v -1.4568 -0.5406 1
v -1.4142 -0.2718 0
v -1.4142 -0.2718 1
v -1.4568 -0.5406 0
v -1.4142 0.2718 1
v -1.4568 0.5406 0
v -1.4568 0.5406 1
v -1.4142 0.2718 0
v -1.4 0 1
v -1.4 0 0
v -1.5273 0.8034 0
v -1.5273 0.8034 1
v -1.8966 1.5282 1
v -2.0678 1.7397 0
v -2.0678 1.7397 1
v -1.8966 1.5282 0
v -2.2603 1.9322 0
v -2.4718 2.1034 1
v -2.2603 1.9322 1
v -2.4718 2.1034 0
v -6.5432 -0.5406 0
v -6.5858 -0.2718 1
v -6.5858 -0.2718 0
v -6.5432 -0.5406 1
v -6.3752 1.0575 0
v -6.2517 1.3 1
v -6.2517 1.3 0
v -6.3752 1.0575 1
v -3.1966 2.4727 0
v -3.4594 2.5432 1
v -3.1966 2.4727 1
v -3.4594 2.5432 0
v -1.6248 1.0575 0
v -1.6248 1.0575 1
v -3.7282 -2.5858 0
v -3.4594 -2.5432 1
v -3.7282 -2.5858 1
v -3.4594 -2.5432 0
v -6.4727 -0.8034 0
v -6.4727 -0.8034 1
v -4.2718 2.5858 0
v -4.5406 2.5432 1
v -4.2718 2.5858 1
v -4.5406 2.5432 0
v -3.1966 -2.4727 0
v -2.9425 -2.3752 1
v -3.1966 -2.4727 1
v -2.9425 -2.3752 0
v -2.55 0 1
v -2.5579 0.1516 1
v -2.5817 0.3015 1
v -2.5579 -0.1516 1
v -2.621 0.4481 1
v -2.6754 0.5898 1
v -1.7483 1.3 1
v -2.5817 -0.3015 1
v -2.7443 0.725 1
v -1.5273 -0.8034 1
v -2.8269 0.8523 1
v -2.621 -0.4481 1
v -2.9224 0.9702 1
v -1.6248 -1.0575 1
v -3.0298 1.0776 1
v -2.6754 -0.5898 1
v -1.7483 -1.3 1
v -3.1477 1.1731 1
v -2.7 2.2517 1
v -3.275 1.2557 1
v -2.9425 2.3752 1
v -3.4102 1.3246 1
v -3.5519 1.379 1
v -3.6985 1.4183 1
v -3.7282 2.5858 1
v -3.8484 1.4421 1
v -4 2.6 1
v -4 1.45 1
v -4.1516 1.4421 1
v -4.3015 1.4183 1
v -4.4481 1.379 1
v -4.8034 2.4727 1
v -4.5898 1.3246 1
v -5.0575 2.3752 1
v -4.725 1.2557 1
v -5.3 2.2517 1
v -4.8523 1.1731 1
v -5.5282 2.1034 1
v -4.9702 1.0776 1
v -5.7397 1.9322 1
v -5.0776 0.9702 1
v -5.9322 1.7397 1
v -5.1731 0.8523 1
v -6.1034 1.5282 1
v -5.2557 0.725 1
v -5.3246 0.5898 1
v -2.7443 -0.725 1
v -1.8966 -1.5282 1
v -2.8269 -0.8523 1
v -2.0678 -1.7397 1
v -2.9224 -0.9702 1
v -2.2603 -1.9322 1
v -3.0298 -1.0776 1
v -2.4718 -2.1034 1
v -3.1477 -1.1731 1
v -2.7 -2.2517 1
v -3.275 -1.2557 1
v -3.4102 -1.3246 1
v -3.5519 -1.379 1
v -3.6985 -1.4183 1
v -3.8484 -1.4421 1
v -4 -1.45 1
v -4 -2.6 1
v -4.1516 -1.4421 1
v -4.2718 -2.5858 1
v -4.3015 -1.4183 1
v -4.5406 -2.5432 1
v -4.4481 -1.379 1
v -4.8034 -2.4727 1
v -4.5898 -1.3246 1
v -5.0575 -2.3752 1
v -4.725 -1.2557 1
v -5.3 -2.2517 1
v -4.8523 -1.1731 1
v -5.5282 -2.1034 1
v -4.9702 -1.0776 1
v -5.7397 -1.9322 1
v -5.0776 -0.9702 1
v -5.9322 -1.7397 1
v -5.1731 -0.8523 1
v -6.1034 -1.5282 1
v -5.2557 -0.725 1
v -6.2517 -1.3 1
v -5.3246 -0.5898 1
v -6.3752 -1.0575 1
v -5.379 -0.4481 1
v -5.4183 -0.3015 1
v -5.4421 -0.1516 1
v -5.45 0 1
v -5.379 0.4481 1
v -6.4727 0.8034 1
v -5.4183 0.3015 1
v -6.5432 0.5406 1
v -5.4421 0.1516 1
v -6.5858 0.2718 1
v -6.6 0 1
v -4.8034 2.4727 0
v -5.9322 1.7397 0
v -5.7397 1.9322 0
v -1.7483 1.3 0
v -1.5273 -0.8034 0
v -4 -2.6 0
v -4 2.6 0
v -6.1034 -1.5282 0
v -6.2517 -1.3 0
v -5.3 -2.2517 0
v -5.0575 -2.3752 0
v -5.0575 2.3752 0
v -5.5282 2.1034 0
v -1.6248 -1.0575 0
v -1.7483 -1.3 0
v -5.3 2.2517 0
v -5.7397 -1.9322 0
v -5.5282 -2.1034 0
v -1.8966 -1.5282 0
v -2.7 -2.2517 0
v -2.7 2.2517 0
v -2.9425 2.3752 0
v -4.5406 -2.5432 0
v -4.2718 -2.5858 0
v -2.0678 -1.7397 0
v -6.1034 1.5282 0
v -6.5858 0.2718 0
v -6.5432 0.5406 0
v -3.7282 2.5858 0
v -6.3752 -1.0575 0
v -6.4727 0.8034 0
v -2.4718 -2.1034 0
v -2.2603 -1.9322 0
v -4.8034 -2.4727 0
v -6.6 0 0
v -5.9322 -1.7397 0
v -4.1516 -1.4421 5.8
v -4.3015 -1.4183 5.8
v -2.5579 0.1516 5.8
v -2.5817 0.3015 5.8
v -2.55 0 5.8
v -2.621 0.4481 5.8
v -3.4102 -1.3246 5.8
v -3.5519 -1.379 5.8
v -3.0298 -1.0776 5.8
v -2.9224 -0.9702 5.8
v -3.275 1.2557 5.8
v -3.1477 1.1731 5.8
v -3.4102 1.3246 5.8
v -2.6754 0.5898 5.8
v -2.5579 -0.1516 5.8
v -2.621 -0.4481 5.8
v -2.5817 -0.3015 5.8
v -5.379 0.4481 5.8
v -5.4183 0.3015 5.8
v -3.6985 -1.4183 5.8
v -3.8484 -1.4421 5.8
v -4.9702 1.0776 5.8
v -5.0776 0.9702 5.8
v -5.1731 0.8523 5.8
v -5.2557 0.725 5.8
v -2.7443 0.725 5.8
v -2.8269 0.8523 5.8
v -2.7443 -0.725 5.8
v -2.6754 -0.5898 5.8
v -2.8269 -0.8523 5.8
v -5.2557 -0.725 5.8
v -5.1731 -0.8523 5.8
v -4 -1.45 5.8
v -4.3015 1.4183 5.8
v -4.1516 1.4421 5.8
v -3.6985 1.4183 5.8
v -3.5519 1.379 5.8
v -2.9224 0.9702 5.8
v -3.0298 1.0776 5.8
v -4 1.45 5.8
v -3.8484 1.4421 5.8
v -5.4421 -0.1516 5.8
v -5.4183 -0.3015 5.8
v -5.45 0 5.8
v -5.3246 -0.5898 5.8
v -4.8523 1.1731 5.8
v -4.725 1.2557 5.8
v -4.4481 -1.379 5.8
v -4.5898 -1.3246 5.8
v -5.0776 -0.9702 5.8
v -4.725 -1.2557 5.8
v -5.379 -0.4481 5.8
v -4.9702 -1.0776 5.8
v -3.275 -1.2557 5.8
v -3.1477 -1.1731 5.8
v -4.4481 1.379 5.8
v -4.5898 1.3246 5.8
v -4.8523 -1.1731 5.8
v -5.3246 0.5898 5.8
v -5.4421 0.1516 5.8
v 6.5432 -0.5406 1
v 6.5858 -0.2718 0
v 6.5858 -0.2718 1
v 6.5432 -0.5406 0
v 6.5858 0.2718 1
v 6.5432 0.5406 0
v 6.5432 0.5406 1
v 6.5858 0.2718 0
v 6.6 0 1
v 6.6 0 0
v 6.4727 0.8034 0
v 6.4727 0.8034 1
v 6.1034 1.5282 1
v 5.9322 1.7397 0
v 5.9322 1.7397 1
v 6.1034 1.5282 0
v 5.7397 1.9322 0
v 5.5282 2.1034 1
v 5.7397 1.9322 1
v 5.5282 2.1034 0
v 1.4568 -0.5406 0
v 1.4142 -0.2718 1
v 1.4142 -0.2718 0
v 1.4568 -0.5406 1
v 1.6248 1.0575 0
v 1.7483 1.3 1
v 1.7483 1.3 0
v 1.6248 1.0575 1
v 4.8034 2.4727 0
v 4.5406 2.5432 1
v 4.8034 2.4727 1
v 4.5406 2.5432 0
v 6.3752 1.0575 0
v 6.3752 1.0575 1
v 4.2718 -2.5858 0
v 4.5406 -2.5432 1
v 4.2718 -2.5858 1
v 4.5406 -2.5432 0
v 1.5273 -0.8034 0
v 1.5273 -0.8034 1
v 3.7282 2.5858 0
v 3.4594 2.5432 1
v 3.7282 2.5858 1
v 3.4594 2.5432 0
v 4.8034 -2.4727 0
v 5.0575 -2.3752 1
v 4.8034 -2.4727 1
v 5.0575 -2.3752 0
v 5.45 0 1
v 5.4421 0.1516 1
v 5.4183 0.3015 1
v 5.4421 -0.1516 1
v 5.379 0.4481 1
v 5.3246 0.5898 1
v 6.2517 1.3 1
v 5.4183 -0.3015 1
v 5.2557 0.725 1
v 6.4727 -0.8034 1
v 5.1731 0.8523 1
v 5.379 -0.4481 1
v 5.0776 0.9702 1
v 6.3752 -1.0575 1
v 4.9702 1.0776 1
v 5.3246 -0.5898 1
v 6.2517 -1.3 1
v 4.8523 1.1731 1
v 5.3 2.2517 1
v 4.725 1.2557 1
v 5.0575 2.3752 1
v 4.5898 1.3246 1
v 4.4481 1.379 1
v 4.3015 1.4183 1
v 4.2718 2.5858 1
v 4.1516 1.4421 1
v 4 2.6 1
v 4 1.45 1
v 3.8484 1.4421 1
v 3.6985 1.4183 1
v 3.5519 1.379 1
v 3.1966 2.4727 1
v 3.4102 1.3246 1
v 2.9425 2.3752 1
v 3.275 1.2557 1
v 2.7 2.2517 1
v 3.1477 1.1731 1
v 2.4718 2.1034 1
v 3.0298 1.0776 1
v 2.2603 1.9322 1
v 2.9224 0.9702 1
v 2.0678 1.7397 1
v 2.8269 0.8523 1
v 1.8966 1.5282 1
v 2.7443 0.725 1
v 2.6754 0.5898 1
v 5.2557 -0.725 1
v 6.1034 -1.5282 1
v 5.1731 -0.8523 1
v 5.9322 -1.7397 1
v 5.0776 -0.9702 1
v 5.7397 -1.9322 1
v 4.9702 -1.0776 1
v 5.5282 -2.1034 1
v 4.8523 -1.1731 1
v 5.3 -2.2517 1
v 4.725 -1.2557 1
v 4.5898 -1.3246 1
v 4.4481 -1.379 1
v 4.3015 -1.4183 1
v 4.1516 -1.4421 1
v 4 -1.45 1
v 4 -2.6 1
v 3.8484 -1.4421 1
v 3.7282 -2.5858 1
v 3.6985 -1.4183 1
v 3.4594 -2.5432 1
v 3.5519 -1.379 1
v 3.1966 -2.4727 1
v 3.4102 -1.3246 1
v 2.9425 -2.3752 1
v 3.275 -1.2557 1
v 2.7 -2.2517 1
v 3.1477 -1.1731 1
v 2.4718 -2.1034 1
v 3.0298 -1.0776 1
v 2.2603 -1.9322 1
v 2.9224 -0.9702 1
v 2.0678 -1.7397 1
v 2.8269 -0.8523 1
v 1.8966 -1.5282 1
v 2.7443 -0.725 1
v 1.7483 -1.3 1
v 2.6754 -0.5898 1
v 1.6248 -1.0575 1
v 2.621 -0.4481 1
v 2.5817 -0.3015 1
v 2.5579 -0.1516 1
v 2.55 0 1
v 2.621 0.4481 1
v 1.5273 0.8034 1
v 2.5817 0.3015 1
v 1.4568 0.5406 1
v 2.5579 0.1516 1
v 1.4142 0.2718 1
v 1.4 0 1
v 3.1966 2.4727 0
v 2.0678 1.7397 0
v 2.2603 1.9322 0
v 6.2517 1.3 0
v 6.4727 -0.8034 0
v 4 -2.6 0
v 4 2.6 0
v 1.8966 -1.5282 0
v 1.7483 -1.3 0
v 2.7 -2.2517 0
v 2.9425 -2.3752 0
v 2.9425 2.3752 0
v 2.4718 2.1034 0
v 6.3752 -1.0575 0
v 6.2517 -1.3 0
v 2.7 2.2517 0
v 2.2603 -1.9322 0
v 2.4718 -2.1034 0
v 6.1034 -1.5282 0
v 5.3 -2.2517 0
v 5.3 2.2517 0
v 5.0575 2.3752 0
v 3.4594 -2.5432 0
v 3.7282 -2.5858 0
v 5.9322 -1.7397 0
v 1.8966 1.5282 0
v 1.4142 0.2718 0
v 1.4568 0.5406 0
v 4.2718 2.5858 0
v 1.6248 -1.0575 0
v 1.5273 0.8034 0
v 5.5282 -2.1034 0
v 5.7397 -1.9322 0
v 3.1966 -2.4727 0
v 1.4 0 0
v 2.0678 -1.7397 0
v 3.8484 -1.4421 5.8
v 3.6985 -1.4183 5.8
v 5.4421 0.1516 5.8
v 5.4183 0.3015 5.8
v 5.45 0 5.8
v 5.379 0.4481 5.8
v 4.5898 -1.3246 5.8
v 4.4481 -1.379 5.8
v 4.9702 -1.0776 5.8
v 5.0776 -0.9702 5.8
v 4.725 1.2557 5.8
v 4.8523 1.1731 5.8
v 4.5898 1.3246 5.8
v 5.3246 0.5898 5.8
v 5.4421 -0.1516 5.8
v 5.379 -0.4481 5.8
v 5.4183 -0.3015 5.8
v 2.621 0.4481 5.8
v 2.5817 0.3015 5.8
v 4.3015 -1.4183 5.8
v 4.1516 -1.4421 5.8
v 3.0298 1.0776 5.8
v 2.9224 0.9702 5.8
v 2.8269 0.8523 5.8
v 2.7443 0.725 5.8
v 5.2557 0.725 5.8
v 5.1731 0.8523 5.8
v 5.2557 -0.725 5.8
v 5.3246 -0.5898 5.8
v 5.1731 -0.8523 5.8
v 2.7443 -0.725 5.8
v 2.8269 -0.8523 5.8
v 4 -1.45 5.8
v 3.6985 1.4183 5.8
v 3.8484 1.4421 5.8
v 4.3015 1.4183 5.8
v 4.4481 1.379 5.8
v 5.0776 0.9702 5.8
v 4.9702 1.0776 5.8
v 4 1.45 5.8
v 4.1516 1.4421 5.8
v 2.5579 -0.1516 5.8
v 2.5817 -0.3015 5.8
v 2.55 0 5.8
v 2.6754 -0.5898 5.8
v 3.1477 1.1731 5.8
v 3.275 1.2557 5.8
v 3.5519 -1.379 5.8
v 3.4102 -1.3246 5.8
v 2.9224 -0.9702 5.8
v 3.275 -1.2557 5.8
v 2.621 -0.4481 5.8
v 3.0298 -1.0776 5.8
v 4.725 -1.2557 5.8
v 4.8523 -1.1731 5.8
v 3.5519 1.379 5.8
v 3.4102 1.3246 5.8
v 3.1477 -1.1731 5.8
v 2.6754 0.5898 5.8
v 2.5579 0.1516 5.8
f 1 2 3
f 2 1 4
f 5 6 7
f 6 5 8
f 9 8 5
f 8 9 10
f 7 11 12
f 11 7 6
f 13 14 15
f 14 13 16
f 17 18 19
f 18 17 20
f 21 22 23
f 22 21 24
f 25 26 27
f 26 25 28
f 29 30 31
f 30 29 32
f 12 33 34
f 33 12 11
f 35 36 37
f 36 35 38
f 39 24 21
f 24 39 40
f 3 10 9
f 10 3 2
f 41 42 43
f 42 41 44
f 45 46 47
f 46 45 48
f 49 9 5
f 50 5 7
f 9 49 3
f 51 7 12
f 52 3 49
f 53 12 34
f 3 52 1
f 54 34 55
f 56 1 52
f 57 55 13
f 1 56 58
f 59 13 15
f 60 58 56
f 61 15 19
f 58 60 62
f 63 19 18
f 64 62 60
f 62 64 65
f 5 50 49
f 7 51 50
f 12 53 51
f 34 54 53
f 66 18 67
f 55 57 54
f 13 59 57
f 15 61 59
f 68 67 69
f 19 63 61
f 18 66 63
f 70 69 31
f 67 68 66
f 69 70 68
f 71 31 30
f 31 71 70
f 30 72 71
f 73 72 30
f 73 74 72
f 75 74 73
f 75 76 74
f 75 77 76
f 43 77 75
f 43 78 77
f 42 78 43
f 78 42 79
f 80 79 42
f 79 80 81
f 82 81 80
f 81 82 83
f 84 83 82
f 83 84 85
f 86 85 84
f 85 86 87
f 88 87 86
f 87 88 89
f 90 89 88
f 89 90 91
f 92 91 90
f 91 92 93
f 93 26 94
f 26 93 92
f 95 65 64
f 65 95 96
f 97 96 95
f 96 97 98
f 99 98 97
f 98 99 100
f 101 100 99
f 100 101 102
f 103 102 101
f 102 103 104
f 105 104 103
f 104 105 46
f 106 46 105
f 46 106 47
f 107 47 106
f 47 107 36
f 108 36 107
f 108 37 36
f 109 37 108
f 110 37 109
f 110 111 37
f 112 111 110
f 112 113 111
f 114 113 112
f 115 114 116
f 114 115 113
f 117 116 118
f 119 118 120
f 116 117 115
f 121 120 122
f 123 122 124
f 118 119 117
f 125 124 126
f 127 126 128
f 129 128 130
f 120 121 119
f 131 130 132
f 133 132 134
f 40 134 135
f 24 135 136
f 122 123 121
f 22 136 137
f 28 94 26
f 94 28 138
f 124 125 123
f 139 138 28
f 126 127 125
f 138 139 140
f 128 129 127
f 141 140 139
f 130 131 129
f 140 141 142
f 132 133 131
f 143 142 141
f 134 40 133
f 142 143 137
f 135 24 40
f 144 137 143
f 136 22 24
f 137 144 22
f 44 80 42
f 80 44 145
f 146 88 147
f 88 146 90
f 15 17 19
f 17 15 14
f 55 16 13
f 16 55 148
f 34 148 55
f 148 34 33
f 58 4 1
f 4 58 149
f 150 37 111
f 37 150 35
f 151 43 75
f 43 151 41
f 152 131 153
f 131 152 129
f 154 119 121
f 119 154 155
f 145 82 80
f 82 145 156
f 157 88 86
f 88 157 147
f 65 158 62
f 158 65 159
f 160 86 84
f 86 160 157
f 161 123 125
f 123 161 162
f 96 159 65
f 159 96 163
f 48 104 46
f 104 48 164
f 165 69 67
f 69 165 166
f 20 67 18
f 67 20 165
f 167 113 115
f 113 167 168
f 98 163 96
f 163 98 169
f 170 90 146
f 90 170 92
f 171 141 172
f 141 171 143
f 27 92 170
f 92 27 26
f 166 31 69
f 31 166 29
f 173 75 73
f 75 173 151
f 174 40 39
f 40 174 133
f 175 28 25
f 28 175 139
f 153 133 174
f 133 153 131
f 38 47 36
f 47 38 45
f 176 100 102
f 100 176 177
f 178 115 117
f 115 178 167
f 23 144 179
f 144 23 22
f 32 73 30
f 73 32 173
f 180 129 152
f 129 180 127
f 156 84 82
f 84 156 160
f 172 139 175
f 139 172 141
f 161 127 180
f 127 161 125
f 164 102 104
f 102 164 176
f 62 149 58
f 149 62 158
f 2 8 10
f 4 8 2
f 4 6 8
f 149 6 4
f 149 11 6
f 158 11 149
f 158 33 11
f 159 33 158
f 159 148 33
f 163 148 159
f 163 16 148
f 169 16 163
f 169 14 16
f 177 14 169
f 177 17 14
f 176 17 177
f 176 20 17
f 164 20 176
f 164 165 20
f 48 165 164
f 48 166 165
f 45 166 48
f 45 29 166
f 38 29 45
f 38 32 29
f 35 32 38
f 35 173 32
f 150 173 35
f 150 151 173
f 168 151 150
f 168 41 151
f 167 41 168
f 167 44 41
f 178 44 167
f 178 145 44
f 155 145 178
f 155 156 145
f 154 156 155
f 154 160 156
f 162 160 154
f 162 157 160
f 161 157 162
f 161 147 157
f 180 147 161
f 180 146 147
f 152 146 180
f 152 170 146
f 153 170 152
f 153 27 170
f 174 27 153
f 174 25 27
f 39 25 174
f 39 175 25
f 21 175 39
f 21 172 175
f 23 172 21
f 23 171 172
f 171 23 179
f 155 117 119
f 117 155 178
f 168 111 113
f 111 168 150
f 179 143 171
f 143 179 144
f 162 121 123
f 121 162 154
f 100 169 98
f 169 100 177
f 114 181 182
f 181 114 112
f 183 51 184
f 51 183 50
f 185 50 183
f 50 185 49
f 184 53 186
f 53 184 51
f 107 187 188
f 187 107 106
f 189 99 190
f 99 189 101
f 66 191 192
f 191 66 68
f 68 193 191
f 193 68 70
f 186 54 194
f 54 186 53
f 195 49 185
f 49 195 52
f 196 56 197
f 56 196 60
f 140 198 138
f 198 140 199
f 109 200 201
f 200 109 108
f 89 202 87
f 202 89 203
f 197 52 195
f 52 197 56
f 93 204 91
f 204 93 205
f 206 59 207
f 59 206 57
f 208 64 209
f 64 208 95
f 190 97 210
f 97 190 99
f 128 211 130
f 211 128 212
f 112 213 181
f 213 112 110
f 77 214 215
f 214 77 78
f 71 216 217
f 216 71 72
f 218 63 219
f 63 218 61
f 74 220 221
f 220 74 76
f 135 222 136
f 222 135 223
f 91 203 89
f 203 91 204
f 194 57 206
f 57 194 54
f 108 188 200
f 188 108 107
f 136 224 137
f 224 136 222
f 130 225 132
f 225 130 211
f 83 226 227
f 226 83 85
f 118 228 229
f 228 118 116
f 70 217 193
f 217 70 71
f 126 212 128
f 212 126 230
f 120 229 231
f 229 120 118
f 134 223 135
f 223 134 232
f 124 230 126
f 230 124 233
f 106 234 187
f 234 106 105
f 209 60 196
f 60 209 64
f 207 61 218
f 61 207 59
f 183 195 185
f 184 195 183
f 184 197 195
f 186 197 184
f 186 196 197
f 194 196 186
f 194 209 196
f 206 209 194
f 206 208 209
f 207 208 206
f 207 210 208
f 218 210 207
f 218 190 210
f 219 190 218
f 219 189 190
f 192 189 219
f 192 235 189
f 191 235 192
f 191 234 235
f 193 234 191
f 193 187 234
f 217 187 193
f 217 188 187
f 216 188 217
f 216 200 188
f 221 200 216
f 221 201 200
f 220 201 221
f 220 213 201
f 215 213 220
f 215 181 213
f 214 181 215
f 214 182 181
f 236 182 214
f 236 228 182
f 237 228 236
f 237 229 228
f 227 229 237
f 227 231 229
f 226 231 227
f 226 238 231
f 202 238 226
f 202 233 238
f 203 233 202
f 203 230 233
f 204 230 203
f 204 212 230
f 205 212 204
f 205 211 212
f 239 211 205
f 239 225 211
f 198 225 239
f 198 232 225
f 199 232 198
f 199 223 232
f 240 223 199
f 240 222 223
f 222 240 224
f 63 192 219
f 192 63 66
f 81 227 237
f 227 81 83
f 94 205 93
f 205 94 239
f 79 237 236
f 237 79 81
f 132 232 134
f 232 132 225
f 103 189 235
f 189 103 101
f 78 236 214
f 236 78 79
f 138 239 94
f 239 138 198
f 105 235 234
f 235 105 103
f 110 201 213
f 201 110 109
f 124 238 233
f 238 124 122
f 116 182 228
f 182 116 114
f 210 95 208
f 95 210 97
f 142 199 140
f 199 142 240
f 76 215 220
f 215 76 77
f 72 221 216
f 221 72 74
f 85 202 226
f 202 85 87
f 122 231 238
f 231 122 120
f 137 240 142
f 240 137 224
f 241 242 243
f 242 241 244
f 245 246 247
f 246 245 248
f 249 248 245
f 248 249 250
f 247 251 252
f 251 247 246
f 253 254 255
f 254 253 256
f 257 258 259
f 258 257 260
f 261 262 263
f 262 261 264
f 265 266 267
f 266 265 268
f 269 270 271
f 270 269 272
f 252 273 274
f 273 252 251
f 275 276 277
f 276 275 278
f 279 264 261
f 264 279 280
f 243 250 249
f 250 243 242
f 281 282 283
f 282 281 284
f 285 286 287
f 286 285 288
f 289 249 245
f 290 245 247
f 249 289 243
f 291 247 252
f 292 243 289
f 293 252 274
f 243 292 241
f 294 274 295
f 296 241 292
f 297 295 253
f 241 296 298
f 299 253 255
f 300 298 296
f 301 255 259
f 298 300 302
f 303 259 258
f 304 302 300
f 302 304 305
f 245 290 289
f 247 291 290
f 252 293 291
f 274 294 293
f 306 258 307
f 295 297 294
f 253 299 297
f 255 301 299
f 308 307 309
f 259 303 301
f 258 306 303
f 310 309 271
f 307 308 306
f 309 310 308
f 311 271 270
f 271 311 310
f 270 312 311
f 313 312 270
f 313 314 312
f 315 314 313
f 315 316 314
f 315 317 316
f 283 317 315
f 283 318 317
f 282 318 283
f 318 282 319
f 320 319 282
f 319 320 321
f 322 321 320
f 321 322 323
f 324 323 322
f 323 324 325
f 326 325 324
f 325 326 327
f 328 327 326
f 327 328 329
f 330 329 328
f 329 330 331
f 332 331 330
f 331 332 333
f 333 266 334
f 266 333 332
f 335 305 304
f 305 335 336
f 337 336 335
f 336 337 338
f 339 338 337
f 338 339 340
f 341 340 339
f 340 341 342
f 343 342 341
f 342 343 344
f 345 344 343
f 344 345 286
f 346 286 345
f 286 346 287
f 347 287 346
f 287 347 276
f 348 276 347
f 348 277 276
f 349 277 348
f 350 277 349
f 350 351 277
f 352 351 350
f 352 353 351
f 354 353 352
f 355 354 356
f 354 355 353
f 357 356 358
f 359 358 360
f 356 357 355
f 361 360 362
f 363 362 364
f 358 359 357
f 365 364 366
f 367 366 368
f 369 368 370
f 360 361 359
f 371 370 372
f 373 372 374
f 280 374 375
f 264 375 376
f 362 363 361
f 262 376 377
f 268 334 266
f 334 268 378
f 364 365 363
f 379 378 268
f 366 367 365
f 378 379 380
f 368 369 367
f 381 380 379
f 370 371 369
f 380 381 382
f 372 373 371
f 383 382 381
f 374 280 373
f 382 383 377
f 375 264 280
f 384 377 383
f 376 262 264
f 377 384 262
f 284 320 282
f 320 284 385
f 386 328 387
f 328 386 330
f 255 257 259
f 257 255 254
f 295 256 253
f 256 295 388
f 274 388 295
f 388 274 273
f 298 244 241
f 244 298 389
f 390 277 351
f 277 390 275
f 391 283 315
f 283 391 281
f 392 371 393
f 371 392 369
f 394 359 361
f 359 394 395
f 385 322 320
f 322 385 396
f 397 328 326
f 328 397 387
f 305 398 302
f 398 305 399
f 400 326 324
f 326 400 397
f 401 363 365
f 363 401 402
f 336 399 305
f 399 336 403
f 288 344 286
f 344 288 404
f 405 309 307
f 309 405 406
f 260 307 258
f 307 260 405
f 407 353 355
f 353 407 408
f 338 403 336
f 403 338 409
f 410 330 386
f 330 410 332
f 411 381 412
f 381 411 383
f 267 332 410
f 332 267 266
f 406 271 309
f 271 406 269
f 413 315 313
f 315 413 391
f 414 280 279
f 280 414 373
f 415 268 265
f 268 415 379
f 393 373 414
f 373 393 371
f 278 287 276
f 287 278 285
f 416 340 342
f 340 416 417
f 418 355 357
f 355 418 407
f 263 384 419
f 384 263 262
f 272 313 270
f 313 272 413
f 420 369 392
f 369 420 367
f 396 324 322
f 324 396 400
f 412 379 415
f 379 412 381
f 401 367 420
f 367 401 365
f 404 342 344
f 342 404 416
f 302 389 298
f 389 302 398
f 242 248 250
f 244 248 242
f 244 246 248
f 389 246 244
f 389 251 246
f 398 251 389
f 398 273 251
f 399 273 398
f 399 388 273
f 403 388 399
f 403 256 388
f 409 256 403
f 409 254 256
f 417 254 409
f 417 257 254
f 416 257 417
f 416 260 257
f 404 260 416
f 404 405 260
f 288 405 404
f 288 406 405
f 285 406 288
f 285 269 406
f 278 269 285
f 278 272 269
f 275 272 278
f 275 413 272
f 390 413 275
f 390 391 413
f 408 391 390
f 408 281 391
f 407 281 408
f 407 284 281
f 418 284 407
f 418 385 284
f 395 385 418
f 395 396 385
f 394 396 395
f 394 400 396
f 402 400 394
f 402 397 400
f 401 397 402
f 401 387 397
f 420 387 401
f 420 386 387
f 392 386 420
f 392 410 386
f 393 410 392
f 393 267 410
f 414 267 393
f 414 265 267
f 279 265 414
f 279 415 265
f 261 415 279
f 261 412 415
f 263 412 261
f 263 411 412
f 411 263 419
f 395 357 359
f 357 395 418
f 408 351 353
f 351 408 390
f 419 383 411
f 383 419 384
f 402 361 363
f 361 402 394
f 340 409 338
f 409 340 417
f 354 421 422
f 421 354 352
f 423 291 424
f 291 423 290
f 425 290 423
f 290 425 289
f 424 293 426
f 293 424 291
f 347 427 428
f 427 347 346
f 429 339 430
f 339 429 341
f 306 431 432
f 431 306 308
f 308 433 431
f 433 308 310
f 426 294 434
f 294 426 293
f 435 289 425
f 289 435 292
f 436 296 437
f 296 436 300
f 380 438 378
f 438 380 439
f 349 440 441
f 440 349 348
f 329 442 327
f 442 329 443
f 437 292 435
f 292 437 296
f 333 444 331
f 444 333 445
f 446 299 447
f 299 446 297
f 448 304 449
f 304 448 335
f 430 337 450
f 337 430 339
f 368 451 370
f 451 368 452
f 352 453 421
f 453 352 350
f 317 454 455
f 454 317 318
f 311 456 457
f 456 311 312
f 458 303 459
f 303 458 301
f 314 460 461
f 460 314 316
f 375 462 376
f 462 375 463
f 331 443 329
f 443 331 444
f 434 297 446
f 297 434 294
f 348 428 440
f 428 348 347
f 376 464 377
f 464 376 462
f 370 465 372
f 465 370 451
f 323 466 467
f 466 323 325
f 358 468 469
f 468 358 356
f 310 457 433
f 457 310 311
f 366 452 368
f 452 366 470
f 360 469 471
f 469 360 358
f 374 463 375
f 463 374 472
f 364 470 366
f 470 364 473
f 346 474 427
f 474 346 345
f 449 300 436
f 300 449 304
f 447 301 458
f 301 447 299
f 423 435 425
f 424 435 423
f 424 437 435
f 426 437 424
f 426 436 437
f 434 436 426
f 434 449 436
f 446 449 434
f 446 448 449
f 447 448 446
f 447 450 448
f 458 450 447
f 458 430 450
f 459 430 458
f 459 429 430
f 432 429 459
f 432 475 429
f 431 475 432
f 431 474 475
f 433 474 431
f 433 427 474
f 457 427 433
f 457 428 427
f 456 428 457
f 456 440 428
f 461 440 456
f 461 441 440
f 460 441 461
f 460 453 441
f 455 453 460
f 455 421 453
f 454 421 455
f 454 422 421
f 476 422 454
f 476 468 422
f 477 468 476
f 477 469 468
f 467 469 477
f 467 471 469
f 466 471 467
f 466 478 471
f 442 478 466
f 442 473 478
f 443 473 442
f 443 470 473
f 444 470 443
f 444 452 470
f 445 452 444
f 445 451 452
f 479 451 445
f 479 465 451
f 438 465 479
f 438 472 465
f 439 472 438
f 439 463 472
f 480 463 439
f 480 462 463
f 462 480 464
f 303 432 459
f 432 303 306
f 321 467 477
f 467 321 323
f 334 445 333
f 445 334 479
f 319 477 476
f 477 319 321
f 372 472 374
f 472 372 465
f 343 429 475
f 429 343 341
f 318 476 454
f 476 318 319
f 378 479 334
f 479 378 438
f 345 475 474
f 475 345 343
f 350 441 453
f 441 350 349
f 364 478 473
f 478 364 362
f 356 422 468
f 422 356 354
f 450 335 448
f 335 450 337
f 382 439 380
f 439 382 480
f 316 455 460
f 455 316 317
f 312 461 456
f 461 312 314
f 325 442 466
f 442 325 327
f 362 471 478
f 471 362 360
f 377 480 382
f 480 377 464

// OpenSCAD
// =====================================================================
// Pimoroni Pico Plus 2 W XL - Flat-Base Tactile Button Plungers
// =====================================================================

$fn = 60;

// --- Plunger Dimensions ---
stem_dia    = 2.90;   // Stem diameter (fits inside 3.5 mm lid hole)
stem_h      = 4.80;   // Stem height extending above the flange plate
flange_dia  = 5.20;   // Retaining base disc diameter
flange_t    = 1.00;   // Base disc thickness (sits under the lid)

module button_plunger() {
    // 1. Bottom Retaining Flange (flat on build plate)
    cylinder(d = flange_dia, h = flange_t);

    // 2. Main Stem (pokes up through lid)
    translate([0, 0, flange_t])
        cylinder(d = stem_dia, h = stem_h);
}

// Render two plungers side-by-side
translate([-4, 0, 0]) button_plunger();
translate([ 4, 0, 0]) button_plunger();
